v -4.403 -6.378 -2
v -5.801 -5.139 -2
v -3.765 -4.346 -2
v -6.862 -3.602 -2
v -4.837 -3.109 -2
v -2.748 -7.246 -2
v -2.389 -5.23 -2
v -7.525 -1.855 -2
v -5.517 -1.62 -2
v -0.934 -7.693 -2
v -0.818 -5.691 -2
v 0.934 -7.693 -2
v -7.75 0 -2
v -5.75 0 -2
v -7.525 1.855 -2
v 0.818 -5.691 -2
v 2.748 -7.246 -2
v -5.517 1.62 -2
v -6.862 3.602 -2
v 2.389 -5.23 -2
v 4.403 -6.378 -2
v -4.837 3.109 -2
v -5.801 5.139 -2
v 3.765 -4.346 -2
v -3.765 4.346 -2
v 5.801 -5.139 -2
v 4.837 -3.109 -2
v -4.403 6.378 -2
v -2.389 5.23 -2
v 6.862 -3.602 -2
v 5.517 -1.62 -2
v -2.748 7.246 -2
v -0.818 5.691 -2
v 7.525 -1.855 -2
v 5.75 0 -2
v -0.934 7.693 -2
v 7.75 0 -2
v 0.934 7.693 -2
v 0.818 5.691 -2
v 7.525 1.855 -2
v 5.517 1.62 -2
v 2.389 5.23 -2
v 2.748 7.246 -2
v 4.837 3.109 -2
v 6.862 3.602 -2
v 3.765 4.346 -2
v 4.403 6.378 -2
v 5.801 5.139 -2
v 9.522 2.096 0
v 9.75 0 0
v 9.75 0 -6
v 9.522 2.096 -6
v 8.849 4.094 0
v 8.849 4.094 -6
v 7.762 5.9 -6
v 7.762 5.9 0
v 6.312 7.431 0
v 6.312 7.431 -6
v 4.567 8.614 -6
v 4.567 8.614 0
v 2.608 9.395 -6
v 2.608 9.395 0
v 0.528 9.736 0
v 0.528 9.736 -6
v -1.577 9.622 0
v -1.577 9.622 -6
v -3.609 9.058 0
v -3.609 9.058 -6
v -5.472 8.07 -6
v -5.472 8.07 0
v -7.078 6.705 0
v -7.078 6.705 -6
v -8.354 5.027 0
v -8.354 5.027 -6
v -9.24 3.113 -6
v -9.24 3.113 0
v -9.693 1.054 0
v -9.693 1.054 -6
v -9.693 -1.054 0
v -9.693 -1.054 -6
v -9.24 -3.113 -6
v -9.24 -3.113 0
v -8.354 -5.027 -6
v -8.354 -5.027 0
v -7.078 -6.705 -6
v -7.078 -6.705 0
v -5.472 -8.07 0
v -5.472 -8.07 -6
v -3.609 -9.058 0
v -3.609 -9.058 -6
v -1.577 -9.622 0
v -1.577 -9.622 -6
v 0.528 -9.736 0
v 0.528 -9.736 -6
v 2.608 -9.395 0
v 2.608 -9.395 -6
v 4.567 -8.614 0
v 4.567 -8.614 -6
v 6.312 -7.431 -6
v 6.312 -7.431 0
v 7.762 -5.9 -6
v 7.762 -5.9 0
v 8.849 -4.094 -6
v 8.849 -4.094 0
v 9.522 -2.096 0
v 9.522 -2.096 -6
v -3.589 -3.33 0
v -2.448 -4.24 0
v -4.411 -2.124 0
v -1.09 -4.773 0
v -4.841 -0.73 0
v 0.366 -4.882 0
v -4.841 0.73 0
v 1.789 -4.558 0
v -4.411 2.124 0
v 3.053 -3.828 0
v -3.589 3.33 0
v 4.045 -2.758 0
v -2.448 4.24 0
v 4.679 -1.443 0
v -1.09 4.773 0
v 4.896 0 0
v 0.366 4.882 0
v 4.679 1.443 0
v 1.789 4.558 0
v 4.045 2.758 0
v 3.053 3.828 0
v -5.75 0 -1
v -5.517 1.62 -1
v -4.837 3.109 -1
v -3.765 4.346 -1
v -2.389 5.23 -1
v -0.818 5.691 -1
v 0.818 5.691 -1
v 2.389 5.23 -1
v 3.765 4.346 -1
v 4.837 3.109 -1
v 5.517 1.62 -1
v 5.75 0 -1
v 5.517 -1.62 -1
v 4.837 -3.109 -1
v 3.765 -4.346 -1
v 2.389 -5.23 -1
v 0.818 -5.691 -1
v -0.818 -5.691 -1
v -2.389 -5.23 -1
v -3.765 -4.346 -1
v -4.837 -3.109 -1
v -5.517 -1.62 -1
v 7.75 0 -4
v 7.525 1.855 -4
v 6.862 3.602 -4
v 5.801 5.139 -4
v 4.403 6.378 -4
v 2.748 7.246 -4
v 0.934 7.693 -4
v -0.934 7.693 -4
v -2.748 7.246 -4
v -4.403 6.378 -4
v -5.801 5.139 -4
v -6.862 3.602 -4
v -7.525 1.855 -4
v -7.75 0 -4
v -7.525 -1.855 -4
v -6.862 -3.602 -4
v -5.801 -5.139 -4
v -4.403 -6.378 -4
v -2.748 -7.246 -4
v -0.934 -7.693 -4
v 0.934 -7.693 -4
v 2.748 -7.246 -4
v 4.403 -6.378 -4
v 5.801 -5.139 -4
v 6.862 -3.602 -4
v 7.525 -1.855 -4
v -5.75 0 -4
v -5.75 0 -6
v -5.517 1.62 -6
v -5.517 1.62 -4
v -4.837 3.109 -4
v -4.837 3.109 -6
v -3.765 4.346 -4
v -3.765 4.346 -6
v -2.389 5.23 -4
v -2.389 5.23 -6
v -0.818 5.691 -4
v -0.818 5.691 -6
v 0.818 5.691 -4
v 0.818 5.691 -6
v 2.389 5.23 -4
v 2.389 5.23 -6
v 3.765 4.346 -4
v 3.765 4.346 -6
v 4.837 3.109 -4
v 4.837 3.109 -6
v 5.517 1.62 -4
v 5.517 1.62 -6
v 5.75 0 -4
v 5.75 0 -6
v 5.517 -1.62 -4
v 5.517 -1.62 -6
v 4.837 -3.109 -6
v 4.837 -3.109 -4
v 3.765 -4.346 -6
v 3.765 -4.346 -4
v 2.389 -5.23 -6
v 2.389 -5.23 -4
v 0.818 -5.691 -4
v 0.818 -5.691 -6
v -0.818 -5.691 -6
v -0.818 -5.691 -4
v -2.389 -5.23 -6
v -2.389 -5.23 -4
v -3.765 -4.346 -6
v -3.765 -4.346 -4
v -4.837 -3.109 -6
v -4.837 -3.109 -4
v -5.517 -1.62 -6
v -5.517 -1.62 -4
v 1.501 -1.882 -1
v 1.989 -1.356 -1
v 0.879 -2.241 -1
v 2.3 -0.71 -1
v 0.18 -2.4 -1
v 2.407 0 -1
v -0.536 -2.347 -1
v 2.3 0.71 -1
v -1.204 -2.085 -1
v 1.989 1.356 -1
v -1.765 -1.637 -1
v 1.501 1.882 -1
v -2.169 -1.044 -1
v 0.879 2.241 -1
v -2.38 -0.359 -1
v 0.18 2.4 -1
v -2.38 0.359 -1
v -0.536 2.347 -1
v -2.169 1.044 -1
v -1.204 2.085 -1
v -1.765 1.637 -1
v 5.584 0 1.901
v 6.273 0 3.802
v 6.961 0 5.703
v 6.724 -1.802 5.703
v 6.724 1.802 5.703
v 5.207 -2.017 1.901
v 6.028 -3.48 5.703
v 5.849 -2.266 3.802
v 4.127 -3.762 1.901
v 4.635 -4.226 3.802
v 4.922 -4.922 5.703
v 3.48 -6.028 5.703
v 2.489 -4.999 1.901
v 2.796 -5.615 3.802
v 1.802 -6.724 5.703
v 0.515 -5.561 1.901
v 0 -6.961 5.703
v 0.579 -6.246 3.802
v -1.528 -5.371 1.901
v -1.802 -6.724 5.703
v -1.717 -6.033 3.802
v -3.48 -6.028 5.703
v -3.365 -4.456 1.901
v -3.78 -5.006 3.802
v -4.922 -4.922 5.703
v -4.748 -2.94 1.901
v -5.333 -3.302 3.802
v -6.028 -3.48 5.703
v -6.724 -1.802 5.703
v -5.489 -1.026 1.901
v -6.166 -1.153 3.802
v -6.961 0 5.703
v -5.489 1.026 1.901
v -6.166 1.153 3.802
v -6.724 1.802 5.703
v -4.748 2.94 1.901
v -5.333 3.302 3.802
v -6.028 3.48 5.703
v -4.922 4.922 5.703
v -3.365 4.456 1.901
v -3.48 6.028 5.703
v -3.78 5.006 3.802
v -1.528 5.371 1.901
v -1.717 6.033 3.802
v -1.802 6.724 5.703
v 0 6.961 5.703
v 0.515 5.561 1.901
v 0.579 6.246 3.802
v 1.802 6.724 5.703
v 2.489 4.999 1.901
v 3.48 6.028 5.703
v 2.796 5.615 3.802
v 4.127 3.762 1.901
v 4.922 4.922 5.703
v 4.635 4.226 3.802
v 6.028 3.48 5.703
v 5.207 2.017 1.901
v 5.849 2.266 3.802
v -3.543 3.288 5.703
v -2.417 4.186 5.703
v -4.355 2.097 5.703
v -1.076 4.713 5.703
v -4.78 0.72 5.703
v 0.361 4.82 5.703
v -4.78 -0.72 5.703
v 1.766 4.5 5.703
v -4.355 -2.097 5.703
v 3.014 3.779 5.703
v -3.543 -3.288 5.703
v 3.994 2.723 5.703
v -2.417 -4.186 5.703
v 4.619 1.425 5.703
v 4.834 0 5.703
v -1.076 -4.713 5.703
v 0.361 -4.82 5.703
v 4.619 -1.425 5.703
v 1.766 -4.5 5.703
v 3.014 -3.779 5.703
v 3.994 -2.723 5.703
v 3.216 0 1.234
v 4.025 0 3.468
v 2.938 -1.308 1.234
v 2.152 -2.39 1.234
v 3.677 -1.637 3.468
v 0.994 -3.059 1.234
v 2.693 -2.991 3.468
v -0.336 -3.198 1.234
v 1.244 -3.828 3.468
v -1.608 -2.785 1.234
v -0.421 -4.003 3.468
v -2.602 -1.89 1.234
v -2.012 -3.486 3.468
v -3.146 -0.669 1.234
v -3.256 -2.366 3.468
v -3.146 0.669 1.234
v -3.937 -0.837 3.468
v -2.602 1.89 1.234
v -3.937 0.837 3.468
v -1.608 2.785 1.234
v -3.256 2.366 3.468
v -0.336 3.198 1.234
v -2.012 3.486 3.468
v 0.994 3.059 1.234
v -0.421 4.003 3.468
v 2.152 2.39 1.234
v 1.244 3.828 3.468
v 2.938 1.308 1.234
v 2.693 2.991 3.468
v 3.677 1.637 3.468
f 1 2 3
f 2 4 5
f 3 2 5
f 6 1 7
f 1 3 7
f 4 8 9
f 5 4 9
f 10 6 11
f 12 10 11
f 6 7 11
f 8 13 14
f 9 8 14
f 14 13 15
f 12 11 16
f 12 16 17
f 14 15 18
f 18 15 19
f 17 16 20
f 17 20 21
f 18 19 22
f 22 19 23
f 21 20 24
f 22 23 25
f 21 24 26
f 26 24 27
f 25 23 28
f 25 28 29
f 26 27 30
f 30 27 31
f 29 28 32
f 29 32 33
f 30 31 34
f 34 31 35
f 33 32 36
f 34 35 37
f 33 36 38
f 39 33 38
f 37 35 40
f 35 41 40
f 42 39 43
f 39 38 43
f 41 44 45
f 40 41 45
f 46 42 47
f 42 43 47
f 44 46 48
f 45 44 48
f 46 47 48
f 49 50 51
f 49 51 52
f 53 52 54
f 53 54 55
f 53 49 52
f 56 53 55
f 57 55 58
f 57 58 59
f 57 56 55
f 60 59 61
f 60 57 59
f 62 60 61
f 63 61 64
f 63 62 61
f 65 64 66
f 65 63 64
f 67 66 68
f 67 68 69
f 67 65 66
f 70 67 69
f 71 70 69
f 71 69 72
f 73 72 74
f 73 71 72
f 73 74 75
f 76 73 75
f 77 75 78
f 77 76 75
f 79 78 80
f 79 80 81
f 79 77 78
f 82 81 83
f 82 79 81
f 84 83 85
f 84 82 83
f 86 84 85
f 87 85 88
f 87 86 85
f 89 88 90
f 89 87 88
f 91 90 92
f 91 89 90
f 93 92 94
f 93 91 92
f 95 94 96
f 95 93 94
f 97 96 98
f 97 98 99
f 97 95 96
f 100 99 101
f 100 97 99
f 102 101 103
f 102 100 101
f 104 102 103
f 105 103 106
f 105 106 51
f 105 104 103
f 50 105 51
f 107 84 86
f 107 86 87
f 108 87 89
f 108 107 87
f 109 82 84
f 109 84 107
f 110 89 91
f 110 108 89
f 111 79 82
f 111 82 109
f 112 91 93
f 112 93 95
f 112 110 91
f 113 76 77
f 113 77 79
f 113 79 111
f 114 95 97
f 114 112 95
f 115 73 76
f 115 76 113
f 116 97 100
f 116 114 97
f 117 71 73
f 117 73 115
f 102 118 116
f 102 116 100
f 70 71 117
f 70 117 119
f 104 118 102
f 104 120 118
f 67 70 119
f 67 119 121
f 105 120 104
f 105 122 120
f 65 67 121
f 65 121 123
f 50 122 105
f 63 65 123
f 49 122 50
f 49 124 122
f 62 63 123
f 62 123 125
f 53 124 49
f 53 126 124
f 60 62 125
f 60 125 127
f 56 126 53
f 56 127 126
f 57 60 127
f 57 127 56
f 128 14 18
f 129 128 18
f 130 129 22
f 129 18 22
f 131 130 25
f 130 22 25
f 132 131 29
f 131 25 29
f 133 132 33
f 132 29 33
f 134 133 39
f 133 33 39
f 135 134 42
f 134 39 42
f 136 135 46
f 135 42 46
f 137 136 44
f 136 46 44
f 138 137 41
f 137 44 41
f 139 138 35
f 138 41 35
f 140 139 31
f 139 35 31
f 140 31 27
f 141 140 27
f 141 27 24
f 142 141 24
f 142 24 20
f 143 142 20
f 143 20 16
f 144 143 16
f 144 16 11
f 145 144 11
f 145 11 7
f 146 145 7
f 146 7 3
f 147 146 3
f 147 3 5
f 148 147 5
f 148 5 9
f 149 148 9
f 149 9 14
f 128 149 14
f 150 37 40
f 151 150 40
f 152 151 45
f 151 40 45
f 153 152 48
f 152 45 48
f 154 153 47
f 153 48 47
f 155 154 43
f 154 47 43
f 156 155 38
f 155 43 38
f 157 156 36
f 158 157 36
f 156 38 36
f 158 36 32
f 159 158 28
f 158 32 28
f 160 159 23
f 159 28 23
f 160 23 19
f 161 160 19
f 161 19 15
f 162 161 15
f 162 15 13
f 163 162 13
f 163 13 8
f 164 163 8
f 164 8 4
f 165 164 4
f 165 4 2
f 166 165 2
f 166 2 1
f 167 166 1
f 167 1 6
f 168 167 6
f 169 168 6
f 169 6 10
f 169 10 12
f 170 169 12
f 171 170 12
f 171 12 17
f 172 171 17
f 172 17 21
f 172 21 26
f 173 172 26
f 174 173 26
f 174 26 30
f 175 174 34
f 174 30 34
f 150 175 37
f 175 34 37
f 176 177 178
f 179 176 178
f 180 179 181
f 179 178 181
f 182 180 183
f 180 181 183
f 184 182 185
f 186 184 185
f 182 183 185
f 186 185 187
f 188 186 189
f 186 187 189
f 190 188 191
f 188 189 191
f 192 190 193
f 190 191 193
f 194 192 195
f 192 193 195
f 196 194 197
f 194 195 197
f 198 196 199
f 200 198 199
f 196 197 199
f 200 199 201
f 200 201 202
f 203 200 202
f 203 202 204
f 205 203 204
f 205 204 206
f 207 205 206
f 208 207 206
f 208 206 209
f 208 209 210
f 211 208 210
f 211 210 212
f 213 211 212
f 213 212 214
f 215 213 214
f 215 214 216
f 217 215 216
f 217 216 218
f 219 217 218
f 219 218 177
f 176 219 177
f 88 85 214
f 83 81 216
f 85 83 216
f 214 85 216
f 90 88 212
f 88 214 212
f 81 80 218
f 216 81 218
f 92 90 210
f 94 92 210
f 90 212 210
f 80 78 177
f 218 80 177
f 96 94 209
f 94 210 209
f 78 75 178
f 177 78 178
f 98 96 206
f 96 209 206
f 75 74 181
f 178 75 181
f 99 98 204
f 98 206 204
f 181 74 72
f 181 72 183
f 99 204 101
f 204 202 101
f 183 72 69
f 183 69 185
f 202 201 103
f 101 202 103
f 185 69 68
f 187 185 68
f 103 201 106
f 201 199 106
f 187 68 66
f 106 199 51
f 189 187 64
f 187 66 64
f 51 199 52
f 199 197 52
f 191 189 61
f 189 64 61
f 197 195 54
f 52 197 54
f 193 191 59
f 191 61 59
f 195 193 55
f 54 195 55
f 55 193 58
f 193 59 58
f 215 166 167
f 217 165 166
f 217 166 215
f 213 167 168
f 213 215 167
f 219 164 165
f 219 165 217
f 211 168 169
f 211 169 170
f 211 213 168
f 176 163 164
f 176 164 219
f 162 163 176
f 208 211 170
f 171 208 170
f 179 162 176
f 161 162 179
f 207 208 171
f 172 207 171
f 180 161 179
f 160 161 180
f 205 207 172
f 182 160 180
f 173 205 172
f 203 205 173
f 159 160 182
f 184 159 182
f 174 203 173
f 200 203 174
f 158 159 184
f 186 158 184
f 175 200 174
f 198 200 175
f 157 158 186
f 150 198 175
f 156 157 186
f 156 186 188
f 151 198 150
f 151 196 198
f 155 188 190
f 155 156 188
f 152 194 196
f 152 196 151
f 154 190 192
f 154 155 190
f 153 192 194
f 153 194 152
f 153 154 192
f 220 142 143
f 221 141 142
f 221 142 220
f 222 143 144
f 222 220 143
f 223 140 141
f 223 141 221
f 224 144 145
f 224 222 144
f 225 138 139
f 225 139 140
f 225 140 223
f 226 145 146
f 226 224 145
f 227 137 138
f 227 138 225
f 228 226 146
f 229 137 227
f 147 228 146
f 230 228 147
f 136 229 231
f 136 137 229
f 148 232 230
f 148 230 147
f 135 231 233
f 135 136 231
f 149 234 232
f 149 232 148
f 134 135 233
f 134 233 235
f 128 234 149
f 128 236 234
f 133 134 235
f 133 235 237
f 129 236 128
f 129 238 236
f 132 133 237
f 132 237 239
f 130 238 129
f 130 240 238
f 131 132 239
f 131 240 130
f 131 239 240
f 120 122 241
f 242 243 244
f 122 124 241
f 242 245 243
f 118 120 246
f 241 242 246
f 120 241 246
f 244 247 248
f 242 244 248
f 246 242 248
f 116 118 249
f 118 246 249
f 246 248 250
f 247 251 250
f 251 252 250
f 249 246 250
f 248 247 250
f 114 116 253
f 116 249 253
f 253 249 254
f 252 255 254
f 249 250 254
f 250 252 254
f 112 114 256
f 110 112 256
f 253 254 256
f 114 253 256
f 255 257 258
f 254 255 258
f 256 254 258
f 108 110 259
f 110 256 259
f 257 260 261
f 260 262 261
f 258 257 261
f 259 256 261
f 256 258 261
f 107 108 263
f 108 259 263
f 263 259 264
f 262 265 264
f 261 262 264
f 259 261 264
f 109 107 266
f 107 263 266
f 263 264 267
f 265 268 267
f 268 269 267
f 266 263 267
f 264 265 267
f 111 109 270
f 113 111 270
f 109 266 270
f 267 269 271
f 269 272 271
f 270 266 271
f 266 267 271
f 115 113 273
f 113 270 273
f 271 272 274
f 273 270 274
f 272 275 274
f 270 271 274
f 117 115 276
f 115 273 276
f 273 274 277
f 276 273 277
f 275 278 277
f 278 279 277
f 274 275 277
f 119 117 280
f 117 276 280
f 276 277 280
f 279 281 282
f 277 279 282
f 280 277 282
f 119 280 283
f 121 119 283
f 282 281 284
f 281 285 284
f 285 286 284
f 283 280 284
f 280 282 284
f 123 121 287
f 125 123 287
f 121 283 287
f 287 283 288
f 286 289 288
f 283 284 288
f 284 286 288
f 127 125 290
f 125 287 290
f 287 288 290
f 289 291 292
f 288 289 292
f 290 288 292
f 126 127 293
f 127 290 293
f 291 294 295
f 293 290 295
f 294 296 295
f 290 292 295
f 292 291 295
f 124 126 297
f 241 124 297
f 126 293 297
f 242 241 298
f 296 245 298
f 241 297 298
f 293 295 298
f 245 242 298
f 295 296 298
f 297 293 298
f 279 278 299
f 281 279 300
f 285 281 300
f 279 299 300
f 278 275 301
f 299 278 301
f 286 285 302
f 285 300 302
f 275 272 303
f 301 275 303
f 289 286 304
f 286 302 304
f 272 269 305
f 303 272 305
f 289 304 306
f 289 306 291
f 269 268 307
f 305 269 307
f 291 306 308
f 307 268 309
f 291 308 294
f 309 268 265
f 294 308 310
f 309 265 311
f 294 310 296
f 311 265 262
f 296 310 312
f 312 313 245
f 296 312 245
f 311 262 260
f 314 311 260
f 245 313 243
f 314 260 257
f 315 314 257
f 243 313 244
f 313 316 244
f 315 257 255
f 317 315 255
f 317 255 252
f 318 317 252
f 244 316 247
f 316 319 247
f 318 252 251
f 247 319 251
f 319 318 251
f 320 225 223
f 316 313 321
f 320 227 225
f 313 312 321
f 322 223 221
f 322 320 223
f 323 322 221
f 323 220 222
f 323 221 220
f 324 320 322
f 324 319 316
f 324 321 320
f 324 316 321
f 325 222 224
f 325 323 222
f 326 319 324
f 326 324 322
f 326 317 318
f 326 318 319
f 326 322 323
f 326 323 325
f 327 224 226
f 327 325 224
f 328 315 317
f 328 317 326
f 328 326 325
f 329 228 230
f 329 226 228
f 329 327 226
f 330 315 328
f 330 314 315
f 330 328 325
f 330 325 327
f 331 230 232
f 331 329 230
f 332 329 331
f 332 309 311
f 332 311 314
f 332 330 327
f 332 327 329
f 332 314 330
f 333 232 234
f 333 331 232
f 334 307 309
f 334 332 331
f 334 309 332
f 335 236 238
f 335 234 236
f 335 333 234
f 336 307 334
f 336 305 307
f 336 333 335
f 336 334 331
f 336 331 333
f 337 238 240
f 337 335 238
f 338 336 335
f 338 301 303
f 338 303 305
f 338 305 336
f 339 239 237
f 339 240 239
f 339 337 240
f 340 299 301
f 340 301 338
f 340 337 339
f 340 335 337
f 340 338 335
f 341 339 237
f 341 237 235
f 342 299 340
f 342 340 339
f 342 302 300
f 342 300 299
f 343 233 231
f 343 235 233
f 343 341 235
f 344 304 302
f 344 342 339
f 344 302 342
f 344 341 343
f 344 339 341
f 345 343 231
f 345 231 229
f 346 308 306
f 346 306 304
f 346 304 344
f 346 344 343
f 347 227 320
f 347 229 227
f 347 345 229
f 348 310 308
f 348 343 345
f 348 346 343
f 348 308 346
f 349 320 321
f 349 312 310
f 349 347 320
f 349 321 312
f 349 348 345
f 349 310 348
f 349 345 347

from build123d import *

# Parameters (mm, degrees)
ESBO_O1_R                = 9.75
RESSALTO_EXTRUS_O1_DEPTH = 6
CASCA9_T                 = -2
ESBO_O3_R                = 2.045070657
CORTE_EXTRUS_O2_DEPTH    = 17.860255581
ESBO_O4_R                = 5.75
CORTE_EXTRUS_O3_DEPTH    = 5


with BuildPart() as part:
    # Esboço1 → Ressalto-extrusão1 (new body)
    with BuildSketch(Plane.XY):
        Circle(ESBO_O1_R)
    extrude(amount=-RESSALTO_EXTRUS_O1_DEPTH)

    # Esboço2 → Revolução1 (revolve)
    with BuildSketch(Plane(origin=(0, 0, 0), x_dir=(1, 0, 0), z_dir=(0, 1, 0)), mode=Mode.PRIVATE) as revolu_o1_sk:
        Polygon((0, 0), (-4.896169564, 0), (-6.960749361, -5.702742821), (0, -5.702742821), align=None)
    revolve(revolu_o1_sk.sketch.rotate(Axis((0, 0, 5.702742821), (0, 0, -1)), 180), axis=Axis((0, 0, 5.702742821), (0, 0, -1)))

    # Casca9
    casca9_openings = [part.faces().sort_by_distance(p)[0] for p in [
        (0, 0, 5.702742821),
    ]]
    offset(amount=CASCA9_T, openings=casca9_openings, kind=Kind.INTERSECTION)

    # Esboço3 → Corte-extrusão2 (cut, through all)
    with BuildSketch(Plane.XY.offset(-4)):
        Circle(ESBO_O3_R)
    extrude(amount=-CORTE_EXTRUS_O2_DEPTH, mode=Mode.SUBTRACT)

    # Esboço4 → Corte-extrusão3 (cut)
    with BuildSketch(Plane(origin=(0, 0, -6), x_dir=(-1, 0, 0), z_dir=(0, 0, -1))):
        Circle(ESBO_O4_R)
    extrude(amount=-CORTE_EXTRUS_O3_DEPTH, mode=Mode.SUBTRACT)


solid = part.part
